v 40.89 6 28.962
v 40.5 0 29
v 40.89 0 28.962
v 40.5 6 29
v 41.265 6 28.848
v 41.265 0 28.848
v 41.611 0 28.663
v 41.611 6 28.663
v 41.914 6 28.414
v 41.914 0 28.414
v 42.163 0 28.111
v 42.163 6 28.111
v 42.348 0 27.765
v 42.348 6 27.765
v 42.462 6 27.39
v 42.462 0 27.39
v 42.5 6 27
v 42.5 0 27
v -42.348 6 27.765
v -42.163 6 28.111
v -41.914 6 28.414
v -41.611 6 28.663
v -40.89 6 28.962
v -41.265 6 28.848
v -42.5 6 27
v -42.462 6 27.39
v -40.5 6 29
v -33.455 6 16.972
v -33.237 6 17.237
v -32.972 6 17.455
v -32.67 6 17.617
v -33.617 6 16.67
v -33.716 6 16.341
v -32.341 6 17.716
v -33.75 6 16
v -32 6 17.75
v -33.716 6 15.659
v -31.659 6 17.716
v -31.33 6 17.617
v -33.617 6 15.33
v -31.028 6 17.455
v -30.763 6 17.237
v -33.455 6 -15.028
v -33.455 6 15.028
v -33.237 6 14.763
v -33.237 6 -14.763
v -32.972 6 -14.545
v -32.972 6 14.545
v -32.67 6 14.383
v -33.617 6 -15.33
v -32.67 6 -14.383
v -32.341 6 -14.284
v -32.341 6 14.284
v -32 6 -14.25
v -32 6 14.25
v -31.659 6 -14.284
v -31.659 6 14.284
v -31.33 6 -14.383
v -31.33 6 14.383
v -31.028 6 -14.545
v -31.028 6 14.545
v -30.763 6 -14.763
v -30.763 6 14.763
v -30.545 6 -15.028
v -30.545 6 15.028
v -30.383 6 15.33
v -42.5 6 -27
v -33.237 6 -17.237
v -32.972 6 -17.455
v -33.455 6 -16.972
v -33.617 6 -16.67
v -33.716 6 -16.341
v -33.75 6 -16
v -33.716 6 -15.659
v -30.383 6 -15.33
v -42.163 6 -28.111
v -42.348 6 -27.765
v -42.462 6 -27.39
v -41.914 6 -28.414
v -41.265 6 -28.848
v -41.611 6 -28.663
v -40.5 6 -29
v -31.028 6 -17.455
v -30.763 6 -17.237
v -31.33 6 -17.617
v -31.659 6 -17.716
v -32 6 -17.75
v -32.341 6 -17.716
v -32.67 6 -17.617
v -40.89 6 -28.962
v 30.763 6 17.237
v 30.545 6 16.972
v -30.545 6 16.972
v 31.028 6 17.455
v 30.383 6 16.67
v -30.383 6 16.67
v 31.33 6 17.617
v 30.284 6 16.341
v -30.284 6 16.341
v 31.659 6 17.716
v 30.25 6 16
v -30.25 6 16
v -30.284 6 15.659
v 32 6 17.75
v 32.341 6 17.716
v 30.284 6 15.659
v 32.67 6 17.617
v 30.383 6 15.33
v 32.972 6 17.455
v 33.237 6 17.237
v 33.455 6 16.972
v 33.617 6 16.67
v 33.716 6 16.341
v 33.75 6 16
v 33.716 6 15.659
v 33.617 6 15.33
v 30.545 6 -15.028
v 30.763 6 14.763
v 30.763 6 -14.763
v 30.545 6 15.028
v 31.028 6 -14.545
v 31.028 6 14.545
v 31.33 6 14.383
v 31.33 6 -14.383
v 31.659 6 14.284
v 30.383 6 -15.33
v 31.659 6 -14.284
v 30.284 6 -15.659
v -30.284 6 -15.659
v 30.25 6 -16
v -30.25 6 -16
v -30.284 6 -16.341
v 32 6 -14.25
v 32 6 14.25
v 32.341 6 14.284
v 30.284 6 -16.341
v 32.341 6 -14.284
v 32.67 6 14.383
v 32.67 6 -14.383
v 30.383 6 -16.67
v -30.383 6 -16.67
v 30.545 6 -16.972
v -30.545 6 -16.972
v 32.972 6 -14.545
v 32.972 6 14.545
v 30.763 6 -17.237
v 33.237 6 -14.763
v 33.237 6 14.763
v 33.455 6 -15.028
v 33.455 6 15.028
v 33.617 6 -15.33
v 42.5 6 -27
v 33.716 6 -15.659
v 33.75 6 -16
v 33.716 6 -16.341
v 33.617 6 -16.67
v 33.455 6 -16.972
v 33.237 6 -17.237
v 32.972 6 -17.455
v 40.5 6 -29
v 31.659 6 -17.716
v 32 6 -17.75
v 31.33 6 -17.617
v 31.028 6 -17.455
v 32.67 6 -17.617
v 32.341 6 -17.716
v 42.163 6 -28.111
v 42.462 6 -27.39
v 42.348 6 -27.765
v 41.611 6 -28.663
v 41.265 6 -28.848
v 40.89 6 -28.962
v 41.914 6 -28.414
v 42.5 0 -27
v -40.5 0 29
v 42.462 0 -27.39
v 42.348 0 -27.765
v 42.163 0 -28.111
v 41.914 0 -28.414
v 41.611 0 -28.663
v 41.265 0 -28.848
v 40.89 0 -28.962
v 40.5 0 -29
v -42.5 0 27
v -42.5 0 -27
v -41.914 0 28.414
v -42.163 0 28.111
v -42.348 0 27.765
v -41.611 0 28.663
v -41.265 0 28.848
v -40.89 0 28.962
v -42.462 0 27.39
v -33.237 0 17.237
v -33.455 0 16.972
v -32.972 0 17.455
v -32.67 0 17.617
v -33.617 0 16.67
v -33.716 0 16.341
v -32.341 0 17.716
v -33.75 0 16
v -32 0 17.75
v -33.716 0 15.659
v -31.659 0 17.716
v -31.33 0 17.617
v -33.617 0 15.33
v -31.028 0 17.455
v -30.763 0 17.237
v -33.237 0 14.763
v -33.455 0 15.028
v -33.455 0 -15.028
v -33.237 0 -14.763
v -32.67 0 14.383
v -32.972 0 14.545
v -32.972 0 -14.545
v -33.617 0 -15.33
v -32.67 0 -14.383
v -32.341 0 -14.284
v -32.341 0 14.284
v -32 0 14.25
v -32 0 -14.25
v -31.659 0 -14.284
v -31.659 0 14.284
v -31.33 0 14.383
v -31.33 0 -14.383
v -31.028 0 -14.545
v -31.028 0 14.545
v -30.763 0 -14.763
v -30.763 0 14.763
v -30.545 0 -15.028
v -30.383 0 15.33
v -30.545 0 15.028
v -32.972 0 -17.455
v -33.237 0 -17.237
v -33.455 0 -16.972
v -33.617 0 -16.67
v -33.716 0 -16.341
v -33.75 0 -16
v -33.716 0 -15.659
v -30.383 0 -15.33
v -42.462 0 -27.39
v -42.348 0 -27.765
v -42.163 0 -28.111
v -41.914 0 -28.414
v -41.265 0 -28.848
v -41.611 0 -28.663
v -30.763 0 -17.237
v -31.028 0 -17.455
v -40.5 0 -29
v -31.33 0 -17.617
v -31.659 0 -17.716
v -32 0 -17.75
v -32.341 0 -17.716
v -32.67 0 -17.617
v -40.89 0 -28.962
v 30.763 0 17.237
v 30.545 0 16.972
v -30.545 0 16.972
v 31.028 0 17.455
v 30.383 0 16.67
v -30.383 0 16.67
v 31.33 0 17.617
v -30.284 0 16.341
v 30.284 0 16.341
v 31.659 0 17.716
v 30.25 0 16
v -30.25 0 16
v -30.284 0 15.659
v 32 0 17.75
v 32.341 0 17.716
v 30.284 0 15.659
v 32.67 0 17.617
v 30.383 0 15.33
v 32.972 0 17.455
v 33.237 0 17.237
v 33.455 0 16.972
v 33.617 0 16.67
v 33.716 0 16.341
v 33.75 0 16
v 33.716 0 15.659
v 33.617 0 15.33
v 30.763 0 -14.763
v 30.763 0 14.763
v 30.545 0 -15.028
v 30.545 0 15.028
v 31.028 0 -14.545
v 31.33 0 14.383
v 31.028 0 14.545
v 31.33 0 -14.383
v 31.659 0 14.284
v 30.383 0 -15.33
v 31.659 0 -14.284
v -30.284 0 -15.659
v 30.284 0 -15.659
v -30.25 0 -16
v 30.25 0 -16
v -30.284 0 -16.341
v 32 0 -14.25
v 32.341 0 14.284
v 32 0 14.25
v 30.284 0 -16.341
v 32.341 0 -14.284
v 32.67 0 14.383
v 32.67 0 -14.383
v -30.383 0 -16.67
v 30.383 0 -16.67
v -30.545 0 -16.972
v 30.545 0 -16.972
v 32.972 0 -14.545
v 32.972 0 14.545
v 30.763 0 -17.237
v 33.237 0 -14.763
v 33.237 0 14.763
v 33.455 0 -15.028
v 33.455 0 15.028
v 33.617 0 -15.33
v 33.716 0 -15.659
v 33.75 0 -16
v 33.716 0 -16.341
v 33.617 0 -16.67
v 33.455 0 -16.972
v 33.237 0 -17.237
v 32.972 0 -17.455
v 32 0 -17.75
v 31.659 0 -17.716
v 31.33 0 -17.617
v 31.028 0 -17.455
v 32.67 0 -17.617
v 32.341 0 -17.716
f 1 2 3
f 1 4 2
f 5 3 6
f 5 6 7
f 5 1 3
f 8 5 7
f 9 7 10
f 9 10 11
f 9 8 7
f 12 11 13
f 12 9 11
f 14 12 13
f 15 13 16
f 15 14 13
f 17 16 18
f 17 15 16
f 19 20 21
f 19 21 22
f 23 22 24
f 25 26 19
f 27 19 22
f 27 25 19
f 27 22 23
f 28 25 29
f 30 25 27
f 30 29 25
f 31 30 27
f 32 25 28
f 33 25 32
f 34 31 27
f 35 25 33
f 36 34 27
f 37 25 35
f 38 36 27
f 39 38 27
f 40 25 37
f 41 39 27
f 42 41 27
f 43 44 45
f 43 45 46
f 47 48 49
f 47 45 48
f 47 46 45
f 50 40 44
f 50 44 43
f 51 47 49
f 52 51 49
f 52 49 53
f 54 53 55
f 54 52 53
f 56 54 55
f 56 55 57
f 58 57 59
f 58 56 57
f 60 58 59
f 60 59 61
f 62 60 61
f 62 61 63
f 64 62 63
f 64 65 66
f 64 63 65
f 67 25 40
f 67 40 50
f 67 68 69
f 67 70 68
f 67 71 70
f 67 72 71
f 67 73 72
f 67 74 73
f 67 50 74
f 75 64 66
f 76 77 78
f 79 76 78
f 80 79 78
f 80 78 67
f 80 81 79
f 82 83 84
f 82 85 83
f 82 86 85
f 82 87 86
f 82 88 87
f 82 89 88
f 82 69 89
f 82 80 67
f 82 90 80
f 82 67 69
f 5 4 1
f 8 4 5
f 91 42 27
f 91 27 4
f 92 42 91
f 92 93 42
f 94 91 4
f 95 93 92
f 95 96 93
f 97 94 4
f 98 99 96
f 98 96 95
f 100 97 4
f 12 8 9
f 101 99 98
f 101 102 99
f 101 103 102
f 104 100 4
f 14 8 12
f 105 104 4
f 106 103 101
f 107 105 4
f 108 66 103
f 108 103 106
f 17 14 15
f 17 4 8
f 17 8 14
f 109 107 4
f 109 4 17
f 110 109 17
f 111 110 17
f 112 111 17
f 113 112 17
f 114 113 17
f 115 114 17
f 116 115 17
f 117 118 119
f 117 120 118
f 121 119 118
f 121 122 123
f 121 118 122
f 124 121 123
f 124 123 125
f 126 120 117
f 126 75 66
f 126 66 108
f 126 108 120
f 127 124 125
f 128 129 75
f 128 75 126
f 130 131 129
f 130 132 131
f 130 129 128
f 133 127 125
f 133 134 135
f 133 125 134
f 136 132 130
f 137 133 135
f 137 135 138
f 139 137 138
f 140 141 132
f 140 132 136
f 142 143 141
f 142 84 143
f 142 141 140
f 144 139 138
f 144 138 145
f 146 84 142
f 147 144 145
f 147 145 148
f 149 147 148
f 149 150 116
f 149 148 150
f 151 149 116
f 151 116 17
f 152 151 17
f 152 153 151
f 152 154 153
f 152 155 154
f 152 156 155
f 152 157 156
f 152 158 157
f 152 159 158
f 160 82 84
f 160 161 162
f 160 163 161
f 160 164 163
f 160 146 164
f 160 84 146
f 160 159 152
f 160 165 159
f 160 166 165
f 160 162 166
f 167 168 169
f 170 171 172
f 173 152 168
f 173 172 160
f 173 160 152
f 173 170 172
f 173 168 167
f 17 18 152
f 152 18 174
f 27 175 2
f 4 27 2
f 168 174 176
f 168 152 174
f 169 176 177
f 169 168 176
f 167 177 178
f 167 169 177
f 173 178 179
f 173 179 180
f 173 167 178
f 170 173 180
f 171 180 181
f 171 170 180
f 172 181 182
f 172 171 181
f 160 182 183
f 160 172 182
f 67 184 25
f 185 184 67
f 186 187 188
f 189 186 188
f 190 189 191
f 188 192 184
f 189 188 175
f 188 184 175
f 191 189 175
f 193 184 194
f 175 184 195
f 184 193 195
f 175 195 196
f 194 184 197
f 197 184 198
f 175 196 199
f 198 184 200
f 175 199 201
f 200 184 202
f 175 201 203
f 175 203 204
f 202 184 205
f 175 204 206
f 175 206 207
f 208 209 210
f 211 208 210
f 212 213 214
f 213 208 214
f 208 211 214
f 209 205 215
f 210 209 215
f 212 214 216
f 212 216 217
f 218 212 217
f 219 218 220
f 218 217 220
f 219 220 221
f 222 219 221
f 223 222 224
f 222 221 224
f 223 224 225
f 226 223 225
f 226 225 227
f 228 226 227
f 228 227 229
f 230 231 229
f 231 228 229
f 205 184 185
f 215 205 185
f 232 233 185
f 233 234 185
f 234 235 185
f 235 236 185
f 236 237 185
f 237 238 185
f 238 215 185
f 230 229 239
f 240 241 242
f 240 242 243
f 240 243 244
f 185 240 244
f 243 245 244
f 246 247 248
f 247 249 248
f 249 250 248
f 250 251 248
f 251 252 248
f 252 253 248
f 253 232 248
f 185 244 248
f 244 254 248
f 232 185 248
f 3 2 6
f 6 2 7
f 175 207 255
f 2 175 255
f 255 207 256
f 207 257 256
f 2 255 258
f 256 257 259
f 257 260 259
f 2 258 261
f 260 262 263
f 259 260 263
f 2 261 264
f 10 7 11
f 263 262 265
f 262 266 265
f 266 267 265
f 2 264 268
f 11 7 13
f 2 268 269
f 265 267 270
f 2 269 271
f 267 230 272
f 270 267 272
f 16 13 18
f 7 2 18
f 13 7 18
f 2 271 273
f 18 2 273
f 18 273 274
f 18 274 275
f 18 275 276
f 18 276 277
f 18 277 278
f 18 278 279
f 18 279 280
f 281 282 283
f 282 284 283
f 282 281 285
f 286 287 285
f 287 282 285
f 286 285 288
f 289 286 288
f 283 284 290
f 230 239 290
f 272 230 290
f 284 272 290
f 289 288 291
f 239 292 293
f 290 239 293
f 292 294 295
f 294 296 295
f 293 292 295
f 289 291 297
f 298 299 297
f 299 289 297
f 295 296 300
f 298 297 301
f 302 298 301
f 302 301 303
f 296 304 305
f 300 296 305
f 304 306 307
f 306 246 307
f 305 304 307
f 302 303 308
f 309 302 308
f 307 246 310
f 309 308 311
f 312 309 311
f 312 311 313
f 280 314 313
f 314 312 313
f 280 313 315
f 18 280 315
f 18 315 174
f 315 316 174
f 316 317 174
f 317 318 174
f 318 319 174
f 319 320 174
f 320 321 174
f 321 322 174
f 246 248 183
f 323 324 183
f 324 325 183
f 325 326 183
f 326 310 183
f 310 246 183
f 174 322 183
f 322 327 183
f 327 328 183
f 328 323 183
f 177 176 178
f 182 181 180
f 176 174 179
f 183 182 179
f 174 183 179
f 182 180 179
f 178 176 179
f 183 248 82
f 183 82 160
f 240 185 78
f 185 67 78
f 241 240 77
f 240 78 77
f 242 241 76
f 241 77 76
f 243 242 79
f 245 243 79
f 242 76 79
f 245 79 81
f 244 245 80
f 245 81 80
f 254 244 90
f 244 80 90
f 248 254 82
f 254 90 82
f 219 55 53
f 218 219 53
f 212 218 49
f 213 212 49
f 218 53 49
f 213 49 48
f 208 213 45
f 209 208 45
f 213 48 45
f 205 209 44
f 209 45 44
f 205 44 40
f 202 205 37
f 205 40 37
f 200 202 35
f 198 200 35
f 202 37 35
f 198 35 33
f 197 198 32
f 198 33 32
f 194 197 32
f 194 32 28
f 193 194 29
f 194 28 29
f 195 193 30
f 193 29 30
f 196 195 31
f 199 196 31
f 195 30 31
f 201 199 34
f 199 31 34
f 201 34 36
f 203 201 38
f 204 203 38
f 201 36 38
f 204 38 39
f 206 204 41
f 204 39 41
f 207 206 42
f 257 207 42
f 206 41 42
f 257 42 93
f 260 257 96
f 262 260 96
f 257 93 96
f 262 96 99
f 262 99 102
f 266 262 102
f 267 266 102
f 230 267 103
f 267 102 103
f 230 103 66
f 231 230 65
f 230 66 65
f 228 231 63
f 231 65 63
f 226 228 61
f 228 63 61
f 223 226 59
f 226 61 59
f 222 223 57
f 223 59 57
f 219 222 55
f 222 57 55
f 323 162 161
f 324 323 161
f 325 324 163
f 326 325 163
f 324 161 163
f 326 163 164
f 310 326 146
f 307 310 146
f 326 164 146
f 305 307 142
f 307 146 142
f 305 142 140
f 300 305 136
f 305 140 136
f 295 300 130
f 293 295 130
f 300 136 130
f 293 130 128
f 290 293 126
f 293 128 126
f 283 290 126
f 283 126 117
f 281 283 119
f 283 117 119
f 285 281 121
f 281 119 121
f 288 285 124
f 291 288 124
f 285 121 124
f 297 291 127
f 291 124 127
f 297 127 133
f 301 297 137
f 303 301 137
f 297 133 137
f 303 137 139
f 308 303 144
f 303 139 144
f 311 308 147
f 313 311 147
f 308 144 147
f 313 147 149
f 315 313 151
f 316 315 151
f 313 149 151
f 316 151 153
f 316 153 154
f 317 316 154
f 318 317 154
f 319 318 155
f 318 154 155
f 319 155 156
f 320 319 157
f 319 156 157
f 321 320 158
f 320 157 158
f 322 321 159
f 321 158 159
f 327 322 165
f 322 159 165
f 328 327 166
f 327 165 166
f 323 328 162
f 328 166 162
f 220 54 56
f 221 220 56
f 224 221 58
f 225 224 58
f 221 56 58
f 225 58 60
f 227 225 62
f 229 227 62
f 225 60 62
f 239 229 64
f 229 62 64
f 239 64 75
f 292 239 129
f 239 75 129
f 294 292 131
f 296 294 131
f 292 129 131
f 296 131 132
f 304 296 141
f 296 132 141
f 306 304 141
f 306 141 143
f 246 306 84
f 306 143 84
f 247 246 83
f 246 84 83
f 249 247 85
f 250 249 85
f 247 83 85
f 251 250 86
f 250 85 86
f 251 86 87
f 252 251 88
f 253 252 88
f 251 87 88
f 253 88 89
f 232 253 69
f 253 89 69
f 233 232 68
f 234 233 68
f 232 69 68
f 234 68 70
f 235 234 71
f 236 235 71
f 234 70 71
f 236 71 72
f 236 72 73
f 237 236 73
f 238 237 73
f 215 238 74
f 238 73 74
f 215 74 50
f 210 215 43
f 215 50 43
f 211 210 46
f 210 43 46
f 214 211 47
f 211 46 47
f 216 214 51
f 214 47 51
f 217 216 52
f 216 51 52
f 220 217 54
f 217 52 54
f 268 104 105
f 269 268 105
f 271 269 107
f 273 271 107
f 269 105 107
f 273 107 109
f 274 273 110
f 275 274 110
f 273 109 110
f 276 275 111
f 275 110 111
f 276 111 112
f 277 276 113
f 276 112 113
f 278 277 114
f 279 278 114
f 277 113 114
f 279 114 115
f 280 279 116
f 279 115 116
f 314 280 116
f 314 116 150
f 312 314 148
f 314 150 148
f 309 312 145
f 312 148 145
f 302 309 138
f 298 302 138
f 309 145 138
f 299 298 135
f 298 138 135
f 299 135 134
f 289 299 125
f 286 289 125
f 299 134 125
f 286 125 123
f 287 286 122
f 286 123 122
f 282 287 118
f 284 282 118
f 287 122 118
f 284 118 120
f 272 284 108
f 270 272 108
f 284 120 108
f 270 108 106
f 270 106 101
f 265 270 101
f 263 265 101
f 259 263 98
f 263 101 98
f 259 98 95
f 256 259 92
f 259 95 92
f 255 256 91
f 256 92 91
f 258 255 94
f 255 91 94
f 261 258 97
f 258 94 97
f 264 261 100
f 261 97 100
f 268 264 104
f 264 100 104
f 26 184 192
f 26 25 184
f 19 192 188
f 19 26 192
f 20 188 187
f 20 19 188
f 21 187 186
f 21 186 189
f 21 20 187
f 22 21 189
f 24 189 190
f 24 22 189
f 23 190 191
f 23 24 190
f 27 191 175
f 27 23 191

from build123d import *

# Parameters (mm, degrees)
SKETCH_1_W          = 85
SKETCH_1_H          = 58
EXTRUDE_1_DEPTH     = 6
FILLET_1_R          = 2
SKETCH_2_R          = 1.75
CUT_EXTRUDE_1_DEPTH = 6


with BuildPart() as part:
    # 草图1 → 凸台-拉伸1 (new body)
    with BuildSketch(Plane(origin=(0, 0, 0), x_dir=(1, 0, 0), z_dir=(0, 1, 0))):
        Rectangle(SKETCH_1_W, SKETCH_1_H)
    extrude(amount=EXTRUDE_1_DEPTH)

    # 圆角1
    fillet_1_edges = [part.edges().sort_by_distance(p)[0] for p in [
        (42.5, 3, 29),
        (-42.5, 3, 29),
        (-42.5, 3, -29),
        (42.5, 3, -29),
    ]]
    fillet(fillet_1_edges, radius=FILLET_1_R)

    # 草图2 → 切除-拉伸1 (cut)
    with BuildSketch(Plane(origin=(0, 6, 0), x_dir=(1, 0, 0), z_dir=(0, 1, 0))):
        with Locations(Location((-32, 16, 0), (0, 0, 270))):
            Circle(SKETCH_2_R)
        with Locations(Location((32, 16, 0), (0, 0, 90))):
            Circle(SKETCH_2_R)
        with Locations(Location((32, -16, 0), (0, 0, 270))):
            Circle(SKETCH_2_R)
        with Locations(Location((-32, -16, 0), (0, 0, 90))):
            Circle(SKETCH_2_R)
    extrude(amount=-CUT_EXTRUDE_1_DEPTH, mode=Mode.SUBTRACT)


solid = part.part
